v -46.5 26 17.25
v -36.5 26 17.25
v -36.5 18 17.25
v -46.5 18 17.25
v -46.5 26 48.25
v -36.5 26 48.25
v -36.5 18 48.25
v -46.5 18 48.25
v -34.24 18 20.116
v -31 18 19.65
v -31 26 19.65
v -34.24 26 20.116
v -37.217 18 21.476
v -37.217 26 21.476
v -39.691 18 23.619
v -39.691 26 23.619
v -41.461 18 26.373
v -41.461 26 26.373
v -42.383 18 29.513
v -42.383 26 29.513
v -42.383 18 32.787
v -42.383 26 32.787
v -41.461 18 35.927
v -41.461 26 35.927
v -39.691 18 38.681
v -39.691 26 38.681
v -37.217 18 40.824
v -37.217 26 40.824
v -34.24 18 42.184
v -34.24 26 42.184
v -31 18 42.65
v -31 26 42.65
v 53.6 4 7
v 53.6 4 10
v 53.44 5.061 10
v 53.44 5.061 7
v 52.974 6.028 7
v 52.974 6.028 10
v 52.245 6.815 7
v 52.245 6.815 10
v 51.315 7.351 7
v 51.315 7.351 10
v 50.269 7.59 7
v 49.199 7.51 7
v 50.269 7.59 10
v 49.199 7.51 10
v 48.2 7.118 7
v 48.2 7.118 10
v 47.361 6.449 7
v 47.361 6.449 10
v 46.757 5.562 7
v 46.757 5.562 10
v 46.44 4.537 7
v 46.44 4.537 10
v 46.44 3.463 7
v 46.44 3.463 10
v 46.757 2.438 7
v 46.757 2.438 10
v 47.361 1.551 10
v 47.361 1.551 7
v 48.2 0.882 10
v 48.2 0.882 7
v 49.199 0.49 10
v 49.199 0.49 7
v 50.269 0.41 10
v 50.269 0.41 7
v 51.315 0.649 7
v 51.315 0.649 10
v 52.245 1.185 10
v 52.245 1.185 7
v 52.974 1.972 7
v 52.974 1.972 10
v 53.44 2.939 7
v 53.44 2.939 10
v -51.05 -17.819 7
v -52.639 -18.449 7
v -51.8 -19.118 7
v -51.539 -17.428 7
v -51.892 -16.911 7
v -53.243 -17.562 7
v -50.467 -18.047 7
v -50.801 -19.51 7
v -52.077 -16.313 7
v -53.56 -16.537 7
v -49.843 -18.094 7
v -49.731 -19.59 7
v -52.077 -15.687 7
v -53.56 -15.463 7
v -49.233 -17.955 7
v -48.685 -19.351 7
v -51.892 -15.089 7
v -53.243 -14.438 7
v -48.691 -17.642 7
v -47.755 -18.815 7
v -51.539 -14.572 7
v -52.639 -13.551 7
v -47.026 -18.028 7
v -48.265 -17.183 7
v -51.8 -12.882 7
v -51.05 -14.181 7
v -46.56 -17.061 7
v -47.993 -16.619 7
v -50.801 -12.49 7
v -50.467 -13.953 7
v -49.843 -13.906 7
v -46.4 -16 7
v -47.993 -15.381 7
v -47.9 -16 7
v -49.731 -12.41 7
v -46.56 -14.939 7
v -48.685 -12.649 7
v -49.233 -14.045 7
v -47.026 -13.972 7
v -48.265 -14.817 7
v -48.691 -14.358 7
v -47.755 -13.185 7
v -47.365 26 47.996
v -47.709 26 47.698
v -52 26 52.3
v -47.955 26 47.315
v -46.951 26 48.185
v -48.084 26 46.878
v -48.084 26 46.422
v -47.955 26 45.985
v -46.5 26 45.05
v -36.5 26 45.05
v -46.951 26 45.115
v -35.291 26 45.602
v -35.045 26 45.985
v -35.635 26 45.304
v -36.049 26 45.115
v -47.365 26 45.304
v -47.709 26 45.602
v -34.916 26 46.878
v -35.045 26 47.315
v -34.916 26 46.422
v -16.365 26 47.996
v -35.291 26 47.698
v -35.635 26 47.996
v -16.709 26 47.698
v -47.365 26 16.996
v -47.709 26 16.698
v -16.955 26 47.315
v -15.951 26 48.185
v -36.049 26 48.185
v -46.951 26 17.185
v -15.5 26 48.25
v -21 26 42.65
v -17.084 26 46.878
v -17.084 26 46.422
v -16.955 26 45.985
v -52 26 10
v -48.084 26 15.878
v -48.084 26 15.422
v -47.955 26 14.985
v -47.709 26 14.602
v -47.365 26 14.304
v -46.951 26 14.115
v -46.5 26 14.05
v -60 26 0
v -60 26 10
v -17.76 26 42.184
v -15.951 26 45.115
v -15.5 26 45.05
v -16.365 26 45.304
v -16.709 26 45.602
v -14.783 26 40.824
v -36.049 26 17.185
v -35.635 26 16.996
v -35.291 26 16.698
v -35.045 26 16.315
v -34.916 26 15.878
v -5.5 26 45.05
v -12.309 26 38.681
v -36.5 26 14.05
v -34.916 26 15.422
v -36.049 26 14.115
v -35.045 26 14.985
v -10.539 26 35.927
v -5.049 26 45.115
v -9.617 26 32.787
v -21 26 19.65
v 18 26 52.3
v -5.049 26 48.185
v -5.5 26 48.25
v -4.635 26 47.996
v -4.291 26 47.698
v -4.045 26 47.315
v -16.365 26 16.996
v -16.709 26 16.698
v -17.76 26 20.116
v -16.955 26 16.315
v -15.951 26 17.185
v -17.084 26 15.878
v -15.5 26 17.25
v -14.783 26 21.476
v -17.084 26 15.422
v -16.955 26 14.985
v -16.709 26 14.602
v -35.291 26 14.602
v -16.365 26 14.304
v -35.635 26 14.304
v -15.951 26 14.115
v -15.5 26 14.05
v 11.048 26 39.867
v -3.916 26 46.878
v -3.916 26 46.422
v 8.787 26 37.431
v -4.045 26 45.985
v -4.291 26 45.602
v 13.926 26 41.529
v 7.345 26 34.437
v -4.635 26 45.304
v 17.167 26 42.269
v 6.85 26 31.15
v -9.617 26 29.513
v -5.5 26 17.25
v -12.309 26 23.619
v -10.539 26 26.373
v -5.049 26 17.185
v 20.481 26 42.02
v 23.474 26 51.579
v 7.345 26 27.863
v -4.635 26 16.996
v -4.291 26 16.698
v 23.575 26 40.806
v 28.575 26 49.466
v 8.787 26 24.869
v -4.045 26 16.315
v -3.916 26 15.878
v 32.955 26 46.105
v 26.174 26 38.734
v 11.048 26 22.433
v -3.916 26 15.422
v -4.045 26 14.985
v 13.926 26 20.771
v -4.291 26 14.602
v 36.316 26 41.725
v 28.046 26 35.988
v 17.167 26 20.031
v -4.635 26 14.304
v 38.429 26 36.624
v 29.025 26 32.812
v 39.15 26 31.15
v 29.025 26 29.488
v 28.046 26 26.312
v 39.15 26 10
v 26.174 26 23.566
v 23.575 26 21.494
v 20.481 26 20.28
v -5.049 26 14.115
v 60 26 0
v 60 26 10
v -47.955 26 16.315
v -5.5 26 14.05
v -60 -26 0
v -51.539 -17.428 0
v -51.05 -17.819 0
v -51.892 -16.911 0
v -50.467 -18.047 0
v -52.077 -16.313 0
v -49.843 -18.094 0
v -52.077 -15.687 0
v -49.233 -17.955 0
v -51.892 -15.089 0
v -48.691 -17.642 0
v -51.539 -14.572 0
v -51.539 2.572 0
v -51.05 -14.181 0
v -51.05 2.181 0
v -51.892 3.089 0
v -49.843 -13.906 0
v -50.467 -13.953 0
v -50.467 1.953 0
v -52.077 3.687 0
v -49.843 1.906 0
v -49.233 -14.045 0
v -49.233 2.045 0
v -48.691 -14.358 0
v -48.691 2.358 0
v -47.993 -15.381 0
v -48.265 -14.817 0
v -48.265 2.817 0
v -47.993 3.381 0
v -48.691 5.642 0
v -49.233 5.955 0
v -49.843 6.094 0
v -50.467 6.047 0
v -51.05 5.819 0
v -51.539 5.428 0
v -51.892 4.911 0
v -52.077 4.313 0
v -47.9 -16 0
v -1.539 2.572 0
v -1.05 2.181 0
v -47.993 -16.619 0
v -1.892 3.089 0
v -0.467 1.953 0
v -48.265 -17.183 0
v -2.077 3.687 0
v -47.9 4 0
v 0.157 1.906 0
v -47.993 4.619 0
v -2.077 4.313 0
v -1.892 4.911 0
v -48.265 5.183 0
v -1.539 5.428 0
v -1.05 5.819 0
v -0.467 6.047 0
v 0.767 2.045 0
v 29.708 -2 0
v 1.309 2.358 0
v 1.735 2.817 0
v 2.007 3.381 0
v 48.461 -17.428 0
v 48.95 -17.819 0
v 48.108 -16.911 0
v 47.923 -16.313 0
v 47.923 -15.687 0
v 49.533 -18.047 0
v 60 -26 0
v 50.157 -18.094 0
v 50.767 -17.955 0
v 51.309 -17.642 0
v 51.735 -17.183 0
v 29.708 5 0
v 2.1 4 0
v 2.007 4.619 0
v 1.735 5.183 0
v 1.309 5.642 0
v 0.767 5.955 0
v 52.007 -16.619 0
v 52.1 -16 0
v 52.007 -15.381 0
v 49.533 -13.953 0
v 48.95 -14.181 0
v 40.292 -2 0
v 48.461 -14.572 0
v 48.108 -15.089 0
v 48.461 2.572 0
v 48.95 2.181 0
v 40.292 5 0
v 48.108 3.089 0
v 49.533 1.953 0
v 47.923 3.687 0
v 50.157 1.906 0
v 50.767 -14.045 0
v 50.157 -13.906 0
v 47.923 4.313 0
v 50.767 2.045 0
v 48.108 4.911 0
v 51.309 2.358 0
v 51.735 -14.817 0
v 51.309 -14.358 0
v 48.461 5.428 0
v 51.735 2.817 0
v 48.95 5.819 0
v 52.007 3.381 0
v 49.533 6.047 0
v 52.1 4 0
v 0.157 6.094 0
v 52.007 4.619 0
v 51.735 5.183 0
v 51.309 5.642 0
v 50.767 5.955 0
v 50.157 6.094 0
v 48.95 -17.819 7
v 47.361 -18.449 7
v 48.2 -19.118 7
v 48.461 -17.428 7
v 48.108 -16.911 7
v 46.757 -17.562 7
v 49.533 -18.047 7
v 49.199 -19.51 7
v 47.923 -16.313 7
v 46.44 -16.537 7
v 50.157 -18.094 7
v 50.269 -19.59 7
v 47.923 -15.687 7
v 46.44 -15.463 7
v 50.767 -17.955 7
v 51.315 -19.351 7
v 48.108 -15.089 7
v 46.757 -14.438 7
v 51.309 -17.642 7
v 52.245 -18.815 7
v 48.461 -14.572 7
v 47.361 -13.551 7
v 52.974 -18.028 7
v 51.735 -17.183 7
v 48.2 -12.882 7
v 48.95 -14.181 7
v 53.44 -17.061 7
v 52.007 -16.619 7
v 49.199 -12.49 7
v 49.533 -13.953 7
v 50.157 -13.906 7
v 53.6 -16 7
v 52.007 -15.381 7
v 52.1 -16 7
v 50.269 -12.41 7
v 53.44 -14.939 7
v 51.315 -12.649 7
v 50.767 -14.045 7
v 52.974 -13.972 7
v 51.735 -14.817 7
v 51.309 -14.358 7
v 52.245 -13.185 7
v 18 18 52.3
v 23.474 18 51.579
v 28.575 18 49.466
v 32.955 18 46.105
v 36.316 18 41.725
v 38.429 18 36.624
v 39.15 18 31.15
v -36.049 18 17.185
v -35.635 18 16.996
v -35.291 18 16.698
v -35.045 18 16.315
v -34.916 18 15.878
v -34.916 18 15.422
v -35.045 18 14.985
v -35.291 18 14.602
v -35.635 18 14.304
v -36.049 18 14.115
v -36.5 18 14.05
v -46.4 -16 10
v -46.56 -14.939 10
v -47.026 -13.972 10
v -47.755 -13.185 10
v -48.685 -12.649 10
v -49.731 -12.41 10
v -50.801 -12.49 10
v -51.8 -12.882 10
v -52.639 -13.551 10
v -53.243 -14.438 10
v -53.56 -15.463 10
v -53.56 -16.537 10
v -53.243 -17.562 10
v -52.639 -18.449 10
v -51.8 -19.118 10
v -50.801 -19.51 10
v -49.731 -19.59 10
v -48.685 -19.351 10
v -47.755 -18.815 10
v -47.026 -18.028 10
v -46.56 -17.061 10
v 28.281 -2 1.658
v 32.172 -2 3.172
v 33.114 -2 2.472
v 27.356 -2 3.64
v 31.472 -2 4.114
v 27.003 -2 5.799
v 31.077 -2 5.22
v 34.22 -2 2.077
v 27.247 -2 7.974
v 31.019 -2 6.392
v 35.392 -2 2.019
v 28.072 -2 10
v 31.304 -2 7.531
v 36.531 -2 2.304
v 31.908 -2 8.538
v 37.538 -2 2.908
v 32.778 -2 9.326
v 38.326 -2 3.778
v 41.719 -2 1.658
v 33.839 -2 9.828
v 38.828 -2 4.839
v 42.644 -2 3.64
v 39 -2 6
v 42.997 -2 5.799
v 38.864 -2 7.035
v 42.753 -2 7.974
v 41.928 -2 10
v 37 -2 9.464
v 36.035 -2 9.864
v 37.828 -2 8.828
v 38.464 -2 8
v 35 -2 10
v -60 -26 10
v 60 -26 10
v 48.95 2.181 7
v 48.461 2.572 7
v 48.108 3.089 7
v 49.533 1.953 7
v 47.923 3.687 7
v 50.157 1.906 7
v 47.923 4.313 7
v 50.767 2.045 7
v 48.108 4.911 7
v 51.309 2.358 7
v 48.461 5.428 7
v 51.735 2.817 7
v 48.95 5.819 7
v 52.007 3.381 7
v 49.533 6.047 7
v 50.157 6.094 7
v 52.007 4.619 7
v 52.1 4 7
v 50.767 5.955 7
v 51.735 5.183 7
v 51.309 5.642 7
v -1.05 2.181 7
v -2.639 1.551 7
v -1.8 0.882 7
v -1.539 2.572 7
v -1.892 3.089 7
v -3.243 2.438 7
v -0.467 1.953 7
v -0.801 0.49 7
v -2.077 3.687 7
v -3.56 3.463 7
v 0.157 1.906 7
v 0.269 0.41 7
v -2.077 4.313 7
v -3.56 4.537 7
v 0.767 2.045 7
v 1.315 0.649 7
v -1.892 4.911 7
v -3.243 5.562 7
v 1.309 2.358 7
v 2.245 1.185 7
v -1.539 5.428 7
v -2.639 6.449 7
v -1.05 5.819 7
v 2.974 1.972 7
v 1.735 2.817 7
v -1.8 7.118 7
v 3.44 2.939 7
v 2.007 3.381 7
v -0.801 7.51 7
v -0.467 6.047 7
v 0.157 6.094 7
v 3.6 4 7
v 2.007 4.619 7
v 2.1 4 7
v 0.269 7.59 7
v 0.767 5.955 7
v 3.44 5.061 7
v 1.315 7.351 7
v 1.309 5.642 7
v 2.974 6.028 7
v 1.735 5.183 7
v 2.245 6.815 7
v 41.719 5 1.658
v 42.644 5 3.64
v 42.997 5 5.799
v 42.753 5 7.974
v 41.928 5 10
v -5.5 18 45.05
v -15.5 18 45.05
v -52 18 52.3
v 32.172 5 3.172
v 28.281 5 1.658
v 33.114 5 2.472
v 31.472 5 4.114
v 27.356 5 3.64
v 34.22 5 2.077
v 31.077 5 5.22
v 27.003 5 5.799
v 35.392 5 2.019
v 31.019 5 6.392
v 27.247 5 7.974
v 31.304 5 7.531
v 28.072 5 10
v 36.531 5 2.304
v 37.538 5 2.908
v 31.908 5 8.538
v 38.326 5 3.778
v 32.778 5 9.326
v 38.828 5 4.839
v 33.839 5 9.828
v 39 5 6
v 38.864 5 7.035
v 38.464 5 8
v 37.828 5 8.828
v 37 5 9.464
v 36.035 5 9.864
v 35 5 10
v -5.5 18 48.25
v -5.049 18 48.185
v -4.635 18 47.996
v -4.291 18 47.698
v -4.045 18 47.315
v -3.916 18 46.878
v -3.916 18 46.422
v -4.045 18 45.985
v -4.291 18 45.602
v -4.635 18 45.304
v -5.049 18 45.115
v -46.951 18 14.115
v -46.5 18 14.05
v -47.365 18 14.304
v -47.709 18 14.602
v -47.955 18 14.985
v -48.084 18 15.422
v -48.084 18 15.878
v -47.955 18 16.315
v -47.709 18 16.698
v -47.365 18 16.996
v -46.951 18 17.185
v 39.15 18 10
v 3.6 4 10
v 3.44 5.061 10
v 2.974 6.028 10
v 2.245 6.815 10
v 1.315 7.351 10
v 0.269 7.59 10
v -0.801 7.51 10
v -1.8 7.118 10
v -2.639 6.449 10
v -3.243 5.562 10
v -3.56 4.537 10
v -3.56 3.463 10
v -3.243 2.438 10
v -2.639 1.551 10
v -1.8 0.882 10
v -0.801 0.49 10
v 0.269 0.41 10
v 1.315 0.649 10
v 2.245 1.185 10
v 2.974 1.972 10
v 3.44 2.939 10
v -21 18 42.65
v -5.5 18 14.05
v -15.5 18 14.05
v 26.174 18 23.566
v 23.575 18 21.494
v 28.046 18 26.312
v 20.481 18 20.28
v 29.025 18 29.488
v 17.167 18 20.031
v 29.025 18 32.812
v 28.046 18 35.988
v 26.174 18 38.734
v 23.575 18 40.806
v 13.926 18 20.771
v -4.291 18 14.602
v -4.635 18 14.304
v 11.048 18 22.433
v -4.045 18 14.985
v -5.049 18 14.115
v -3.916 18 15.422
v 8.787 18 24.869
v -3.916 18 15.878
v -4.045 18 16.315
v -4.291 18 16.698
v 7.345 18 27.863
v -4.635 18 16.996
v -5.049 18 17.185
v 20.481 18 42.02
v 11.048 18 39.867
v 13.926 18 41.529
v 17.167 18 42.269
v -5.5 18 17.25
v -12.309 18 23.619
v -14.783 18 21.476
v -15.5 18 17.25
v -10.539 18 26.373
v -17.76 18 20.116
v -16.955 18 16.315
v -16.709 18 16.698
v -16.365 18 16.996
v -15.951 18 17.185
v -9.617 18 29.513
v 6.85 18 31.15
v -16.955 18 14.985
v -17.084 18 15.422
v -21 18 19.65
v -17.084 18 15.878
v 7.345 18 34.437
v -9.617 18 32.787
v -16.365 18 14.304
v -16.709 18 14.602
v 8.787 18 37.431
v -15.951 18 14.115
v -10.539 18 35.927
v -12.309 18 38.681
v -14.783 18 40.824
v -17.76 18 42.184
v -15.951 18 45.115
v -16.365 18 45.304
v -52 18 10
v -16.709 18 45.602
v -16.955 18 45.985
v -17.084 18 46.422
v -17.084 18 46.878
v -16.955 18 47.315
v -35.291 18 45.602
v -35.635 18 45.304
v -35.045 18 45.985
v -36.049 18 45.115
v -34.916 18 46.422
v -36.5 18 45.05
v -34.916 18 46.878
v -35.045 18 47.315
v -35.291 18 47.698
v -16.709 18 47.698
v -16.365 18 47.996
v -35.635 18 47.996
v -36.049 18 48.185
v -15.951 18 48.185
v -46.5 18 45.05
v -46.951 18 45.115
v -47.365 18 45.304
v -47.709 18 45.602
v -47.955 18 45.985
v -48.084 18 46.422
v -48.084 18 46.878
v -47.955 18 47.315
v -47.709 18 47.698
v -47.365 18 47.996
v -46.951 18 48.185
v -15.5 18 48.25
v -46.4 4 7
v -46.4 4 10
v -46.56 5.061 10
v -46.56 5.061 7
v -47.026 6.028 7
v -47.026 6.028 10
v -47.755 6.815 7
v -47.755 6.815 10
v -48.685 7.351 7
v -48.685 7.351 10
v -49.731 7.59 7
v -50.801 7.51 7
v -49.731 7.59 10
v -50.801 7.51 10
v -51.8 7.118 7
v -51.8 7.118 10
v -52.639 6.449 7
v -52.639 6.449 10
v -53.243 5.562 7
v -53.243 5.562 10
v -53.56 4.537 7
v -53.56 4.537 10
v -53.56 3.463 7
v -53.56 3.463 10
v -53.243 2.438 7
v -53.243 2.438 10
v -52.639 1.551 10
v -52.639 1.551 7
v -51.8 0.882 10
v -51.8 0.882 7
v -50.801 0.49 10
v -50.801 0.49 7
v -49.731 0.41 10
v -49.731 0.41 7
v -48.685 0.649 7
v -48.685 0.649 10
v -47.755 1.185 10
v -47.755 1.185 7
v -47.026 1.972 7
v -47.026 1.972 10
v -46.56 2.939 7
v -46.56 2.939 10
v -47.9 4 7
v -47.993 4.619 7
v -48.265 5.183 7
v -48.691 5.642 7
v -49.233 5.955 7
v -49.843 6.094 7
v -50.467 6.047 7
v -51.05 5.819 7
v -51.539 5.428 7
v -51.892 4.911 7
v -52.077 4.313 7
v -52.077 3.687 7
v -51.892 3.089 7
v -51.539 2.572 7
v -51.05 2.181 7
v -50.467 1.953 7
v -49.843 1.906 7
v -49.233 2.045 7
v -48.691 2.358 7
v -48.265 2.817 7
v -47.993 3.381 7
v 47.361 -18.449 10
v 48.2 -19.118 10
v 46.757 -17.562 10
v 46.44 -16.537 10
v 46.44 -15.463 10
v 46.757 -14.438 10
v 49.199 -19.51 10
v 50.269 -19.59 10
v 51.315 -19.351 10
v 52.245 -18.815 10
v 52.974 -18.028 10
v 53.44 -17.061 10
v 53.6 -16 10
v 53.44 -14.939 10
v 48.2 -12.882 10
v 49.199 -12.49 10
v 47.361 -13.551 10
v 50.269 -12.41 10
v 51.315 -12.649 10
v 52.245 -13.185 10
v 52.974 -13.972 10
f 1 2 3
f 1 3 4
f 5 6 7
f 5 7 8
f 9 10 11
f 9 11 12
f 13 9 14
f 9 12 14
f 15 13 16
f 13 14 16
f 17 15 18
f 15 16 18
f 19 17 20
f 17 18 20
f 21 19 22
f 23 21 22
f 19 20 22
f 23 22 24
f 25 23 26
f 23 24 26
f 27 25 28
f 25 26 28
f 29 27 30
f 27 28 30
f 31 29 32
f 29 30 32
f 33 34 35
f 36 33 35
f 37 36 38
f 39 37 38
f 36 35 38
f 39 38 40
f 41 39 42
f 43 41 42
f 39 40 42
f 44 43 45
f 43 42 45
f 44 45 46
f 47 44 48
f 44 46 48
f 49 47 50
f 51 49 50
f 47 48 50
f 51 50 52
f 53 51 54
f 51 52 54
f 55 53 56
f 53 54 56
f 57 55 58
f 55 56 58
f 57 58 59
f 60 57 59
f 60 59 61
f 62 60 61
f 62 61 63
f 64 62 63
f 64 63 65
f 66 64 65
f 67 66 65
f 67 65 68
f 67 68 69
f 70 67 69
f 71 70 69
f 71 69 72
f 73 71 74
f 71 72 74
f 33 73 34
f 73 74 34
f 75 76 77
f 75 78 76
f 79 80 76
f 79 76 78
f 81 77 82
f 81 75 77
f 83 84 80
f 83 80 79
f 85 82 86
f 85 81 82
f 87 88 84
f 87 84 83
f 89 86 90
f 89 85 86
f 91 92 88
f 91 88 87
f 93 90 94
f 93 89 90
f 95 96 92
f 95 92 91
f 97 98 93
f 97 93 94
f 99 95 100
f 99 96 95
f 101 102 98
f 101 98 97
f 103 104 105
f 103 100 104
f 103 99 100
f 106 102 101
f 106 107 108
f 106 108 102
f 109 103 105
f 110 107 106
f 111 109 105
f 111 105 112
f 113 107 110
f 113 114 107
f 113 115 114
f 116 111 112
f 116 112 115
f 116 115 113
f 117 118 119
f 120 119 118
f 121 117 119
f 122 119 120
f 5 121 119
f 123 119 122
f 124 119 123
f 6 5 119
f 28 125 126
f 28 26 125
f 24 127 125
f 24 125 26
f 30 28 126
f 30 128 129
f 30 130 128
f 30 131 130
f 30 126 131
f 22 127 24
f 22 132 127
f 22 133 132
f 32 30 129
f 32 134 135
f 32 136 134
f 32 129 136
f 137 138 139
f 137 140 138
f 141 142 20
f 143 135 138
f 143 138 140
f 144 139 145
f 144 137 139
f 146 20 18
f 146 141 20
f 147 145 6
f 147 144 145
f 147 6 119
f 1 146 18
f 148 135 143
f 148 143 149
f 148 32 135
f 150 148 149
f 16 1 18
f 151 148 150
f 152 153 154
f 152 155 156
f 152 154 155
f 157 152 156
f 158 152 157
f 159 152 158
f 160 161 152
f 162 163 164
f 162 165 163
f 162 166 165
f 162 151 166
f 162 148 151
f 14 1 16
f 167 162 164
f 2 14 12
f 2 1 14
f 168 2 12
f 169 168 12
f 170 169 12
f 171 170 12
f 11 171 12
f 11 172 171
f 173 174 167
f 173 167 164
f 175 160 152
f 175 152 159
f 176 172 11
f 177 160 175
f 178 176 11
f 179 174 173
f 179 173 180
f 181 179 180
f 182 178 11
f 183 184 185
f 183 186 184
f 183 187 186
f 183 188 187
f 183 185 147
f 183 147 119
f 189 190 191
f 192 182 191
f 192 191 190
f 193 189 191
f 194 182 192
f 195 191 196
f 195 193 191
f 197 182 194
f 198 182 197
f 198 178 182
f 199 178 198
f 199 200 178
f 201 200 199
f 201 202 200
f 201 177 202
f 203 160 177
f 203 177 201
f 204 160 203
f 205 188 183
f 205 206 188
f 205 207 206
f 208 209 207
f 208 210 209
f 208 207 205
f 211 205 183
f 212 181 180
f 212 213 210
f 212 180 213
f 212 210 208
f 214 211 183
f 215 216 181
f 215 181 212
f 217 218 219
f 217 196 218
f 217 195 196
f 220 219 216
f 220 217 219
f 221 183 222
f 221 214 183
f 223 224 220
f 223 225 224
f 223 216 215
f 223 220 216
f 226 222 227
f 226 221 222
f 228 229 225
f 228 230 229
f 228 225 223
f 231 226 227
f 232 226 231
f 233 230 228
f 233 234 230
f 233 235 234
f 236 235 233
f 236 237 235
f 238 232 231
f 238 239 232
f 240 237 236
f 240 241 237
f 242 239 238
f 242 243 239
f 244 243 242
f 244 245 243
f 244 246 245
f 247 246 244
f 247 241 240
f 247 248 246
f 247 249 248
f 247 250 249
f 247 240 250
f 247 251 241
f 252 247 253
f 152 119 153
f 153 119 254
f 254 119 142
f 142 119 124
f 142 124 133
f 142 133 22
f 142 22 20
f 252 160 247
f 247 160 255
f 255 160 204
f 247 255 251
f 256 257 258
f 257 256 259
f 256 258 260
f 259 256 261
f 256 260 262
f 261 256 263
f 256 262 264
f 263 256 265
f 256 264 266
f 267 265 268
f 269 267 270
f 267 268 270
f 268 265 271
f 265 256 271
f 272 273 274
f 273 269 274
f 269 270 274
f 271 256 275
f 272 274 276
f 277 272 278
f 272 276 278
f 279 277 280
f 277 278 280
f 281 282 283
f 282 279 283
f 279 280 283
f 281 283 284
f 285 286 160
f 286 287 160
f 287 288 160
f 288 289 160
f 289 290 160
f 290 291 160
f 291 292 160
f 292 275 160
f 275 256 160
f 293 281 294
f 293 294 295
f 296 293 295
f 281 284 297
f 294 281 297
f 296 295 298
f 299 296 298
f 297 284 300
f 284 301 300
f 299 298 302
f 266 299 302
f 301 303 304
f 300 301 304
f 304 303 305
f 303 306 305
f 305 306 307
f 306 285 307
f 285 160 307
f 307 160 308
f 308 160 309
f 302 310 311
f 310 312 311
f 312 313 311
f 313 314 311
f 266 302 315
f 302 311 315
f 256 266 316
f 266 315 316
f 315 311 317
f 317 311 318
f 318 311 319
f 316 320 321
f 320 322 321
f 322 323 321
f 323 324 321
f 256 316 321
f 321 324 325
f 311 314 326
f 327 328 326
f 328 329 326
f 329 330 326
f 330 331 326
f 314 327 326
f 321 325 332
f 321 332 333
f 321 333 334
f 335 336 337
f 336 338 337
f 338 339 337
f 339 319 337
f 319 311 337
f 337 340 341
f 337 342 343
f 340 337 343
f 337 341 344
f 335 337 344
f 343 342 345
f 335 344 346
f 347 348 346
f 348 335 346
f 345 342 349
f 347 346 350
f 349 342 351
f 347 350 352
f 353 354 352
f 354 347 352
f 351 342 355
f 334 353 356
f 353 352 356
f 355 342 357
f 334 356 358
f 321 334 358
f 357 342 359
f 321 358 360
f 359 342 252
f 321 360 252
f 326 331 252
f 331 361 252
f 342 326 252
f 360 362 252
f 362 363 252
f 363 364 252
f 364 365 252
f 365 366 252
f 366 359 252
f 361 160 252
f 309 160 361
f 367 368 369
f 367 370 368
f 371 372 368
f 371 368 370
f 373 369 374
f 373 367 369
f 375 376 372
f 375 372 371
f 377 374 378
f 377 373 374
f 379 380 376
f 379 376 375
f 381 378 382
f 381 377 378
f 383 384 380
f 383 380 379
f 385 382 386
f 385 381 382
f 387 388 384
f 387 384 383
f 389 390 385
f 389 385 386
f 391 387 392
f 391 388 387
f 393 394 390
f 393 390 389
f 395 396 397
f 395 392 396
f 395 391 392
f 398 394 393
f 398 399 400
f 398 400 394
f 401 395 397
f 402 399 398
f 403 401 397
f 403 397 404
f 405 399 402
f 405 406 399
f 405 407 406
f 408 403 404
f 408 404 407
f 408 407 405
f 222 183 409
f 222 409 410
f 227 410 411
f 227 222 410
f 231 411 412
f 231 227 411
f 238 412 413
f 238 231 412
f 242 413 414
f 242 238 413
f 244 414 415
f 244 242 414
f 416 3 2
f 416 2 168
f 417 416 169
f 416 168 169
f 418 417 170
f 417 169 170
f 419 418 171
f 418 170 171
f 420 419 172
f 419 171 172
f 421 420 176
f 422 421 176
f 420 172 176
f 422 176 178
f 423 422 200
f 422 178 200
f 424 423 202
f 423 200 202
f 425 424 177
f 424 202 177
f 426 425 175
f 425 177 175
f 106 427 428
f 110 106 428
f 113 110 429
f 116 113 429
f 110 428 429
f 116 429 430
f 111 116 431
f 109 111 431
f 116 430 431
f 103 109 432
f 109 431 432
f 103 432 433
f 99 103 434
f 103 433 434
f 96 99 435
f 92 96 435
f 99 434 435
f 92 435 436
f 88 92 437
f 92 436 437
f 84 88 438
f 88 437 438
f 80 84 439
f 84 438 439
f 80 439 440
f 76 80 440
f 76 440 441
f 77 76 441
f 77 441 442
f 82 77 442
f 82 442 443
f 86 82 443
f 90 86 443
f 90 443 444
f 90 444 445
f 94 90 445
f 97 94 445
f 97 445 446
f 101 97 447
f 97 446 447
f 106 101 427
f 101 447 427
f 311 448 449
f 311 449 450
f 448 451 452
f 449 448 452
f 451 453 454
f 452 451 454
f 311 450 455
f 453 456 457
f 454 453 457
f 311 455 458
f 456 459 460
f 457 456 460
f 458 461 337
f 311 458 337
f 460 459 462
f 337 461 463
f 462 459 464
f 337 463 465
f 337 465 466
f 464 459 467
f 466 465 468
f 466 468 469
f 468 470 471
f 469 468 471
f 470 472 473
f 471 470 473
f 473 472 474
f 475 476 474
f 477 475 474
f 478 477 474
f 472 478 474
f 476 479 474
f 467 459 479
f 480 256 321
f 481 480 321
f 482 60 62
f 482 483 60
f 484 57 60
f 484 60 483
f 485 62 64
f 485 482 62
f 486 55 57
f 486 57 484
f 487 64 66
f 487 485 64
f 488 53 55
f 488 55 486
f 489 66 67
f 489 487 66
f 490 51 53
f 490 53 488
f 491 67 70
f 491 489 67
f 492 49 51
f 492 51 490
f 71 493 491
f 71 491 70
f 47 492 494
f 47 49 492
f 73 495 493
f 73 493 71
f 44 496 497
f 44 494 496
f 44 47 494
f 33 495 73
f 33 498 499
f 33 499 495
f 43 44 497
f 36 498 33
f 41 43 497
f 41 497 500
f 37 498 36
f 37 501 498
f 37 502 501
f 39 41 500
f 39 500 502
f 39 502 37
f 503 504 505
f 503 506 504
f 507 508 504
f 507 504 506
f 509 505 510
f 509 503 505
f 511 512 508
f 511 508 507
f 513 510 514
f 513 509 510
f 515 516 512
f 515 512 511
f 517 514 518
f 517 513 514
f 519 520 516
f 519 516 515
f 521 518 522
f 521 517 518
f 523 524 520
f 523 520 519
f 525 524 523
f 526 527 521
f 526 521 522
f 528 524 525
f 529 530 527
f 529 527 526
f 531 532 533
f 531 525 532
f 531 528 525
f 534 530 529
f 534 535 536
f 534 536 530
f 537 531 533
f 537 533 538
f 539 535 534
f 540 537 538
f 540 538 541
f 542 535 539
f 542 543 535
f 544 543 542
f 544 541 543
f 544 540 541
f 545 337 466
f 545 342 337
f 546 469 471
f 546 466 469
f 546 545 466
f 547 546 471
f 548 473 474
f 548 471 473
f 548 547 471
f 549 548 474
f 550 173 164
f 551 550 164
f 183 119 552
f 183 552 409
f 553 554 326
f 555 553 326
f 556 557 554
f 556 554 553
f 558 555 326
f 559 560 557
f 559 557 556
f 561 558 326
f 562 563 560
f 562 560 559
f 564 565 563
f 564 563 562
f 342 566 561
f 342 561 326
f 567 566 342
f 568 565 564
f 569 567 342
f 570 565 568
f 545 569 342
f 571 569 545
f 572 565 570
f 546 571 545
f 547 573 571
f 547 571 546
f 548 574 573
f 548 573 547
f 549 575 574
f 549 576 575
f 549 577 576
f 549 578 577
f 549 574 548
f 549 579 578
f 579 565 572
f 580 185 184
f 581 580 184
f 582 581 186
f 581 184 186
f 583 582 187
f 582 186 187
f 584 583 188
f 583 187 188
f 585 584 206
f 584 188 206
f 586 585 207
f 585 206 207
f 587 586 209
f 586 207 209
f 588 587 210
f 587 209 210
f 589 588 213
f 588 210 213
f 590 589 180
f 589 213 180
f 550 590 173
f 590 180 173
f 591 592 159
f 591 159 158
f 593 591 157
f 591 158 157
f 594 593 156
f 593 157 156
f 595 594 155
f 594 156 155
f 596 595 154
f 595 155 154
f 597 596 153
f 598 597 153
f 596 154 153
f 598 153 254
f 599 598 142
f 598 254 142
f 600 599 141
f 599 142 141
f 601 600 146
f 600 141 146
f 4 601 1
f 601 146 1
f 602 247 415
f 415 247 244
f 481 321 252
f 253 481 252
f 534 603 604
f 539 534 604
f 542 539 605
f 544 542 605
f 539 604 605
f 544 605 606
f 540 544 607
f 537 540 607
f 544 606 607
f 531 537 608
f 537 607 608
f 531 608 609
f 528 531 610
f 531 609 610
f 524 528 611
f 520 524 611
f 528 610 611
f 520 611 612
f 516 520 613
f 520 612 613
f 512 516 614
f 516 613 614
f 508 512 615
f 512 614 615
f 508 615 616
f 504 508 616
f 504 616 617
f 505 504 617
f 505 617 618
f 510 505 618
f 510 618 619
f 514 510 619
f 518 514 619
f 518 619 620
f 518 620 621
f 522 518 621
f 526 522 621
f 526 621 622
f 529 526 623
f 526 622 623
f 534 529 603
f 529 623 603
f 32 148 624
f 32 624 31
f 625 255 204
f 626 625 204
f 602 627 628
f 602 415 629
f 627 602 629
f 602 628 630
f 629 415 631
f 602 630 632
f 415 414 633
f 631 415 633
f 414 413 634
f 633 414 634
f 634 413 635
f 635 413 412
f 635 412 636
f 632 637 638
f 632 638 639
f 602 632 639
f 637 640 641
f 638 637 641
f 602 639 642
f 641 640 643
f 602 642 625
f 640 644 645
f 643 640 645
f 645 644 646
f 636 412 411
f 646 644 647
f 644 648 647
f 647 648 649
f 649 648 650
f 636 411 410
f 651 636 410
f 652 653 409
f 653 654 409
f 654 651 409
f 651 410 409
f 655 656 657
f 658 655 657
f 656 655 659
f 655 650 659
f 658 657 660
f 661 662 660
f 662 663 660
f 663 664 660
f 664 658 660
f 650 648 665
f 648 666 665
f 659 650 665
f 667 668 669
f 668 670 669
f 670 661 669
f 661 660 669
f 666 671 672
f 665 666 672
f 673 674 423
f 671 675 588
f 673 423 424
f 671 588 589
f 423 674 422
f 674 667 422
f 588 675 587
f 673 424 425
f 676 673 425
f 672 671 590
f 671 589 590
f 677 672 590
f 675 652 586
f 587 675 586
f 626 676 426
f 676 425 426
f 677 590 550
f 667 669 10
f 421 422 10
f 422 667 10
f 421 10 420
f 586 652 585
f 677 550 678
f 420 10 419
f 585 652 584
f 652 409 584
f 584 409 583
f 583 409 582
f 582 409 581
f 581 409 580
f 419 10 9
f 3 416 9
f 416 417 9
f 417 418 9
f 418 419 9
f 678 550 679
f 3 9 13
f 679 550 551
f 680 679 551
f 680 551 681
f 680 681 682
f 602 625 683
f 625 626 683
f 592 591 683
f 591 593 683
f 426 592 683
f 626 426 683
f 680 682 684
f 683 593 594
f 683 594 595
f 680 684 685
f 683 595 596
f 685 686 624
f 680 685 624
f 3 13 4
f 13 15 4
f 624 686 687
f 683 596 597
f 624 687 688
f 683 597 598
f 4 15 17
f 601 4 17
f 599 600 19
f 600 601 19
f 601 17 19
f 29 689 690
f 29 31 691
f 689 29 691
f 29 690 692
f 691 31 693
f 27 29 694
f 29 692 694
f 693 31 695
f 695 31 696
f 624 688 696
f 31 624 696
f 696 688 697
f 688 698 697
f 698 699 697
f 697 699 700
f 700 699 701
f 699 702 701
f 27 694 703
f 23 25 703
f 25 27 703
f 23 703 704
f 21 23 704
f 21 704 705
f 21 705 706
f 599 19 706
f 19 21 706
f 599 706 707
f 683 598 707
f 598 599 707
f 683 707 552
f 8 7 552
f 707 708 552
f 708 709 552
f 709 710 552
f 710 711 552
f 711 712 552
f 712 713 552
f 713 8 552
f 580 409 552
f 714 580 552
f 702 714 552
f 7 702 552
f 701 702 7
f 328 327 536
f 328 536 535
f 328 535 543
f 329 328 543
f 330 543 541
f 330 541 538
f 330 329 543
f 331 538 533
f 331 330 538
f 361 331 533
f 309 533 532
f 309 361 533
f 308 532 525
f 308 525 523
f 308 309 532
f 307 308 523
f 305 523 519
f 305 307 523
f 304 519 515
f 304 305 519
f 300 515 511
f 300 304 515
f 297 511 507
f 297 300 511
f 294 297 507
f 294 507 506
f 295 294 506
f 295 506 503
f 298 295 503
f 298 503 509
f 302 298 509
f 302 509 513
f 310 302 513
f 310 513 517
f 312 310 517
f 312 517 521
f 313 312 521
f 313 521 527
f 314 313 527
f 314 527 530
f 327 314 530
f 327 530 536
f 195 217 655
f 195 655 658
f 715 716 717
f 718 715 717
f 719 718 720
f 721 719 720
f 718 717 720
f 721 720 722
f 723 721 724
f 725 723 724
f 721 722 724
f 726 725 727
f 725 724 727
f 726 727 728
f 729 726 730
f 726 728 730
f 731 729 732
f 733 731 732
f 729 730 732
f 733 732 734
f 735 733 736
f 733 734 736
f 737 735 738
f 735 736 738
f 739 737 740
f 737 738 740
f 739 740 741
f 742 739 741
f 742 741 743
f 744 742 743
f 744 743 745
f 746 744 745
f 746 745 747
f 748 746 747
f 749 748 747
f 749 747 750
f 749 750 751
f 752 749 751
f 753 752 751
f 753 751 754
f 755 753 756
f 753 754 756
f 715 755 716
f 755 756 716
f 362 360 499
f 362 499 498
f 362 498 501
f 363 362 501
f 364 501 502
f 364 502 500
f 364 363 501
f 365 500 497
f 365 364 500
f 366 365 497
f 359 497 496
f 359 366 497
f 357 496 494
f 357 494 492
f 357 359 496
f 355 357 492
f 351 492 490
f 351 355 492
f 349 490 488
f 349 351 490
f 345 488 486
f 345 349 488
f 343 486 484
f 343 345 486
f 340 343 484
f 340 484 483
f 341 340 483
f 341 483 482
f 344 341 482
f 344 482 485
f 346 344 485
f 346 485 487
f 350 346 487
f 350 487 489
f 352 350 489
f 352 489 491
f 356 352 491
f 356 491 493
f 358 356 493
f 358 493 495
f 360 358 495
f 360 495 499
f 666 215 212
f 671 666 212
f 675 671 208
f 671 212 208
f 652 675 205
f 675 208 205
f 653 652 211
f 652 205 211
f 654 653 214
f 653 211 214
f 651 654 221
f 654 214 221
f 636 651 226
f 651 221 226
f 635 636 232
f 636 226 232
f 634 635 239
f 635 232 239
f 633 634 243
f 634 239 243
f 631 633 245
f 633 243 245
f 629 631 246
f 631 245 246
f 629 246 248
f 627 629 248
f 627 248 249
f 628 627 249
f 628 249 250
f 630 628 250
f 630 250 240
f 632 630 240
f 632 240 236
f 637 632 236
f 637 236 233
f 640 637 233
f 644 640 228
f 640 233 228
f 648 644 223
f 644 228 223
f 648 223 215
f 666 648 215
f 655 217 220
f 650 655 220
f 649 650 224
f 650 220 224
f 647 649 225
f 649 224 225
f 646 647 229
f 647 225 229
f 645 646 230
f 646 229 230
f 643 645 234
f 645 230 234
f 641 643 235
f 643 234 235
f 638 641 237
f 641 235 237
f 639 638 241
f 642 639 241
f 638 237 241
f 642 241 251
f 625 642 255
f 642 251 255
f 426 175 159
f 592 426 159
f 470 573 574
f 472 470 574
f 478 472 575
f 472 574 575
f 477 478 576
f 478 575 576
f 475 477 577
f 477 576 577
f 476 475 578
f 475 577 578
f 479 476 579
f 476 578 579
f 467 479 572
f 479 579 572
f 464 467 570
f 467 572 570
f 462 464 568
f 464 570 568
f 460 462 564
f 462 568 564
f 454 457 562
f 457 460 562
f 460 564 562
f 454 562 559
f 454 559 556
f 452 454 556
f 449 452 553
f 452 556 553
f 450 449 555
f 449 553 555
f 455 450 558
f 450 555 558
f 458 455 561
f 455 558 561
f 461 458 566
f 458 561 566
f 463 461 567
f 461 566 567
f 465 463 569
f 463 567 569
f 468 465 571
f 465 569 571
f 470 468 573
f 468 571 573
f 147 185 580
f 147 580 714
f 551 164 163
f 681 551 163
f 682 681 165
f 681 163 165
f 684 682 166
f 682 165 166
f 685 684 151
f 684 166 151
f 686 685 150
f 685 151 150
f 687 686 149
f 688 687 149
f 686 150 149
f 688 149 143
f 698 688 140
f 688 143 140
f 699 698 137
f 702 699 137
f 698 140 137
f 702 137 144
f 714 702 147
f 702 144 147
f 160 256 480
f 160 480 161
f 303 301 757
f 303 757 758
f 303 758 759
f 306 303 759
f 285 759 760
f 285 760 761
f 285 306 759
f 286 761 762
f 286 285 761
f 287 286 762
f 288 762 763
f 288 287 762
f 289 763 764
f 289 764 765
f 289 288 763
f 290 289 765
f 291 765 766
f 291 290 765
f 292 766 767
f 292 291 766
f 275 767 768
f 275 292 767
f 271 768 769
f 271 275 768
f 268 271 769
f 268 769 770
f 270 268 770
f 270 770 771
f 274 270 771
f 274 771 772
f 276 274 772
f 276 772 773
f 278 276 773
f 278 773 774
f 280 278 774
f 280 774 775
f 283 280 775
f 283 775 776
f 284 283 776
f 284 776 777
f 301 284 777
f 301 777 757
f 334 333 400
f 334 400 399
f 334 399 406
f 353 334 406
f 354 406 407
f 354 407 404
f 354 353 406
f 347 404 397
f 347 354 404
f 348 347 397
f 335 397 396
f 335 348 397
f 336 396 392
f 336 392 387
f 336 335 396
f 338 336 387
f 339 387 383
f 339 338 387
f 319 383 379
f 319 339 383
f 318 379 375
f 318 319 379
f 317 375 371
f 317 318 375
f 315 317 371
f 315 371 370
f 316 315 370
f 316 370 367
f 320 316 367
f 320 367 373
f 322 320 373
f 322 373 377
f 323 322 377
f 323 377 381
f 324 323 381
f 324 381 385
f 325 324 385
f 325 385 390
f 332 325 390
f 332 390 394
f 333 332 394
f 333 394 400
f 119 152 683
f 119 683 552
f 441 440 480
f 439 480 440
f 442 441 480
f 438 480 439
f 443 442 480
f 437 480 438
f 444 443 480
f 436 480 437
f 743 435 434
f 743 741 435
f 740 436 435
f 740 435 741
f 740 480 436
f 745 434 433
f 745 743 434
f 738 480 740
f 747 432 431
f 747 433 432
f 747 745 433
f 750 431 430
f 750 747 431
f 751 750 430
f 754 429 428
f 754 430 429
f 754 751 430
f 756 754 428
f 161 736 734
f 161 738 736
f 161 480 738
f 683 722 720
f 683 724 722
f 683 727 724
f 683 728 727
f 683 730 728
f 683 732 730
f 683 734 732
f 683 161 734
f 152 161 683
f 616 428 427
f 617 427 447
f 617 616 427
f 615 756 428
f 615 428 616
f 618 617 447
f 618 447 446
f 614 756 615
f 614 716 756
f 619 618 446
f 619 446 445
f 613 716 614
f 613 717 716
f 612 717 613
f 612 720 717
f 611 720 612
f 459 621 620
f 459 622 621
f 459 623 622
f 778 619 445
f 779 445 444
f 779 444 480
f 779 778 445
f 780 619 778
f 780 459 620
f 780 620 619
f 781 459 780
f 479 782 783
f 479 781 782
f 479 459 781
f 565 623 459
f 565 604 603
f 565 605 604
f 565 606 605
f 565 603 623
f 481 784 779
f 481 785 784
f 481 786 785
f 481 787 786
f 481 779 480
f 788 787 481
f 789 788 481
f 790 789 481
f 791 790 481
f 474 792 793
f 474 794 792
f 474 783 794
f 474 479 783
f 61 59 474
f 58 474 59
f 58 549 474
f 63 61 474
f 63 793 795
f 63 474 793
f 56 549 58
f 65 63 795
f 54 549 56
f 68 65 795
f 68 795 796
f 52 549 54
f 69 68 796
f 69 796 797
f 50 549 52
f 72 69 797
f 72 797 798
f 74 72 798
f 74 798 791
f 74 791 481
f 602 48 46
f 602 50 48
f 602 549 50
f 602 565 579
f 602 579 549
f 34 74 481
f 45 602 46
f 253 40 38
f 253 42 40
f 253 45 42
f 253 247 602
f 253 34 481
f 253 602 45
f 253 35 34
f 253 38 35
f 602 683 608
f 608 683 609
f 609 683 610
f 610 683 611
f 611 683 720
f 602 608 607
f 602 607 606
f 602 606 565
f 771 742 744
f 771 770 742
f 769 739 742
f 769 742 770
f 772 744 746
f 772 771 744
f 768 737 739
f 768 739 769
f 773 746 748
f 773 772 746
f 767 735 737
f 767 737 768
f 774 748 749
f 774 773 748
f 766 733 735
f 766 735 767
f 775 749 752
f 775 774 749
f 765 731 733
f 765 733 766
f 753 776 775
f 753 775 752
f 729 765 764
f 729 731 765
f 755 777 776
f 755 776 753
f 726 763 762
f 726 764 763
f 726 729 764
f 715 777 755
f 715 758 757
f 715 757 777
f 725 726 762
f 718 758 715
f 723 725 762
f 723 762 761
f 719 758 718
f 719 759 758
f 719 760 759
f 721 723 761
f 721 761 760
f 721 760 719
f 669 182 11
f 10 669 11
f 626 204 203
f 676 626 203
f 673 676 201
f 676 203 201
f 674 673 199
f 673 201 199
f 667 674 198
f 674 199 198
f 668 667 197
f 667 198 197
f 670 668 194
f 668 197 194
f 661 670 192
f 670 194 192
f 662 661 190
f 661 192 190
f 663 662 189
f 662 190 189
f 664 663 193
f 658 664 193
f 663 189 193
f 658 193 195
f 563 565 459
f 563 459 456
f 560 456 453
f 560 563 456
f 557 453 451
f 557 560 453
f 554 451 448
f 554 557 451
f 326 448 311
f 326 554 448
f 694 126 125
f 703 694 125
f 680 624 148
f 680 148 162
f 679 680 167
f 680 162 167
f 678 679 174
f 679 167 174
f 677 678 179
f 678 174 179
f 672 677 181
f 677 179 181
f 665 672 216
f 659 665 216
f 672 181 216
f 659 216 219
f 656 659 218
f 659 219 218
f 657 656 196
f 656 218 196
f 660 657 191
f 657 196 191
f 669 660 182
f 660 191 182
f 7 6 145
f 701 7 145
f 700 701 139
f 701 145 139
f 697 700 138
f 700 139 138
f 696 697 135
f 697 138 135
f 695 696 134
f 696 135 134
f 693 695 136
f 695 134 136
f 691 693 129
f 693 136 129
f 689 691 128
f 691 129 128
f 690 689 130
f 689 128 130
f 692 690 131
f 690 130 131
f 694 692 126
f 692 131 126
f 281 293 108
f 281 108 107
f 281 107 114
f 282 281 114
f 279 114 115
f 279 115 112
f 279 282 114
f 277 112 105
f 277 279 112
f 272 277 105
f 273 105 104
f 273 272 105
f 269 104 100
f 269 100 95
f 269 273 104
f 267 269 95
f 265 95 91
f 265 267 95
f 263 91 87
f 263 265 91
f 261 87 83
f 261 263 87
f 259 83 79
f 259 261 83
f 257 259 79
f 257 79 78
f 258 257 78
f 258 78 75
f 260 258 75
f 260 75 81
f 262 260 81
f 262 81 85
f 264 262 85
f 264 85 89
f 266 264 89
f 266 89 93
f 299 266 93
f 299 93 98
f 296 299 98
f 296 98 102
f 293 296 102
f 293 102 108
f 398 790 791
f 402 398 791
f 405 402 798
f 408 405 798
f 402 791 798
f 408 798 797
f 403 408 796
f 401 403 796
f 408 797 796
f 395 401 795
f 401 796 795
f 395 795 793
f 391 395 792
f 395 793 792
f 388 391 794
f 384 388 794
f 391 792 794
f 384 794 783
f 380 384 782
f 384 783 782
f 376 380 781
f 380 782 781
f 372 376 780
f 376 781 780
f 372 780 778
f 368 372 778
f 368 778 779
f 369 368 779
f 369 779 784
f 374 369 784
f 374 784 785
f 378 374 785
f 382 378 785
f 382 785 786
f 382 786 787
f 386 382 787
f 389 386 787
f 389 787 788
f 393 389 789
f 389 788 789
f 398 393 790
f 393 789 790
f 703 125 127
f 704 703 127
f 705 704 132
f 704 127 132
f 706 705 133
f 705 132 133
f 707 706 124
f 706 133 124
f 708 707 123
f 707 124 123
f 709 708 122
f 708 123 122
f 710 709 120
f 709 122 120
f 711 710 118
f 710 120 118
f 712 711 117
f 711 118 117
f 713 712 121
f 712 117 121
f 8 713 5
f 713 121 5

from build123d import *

# Parameters (mm, degrees)
CYLINDER001_R     = 4
CYLINDER001_DEPTH = 10
CYLINDER_R        = 8
CYLINDER_DEPTH    = 7
CUT_ROLL_ANGLE    = 90
SKETCH_W          = 120
SKETCH_H          = 52
SKETCH_R          = 2.1
PAD_DEPTH         = 10
SKETCH007_R       = 11.15
PAD001_DEPTH      = 8
SKETCH008_R       = 3.6
SKETCH008_R_2     = 2.1
POCKET_DEPTH      = 3


with BuildPart() as zylinder001:
    # Cylinder001 → Cylinder001 (new body)
    with BuildSketch(Plane.XY):
        Circle(CYLINDER001_R)
    extrude(amount=CYLINDER001_DEPTH)


with BuildPart() as cut:
    # Cylinder → Cylinder (new body)
    with BuildSketch(Plane.XY):
        Circle(CYLINDER_R)
    extrude(amount=CYLINDER_DEPTH)

    # Cut: cut Zylinder001
    add(zylinder001.part, mode=Mode.SUBTRACT)


with BuildPart() as cut_1:
    # Cut roll: moved
    add(cut.part.rotate(Axis((0, 0, 0), (1, 0, 0)), CUT_ROLL_ANGLE))


with BuildPart() as cut_2:
    # Cut placement: moved
    add(cut_1.part.moved(Location((35, 5, 6))))


with BuildPart() as cut001:
    # Sketch → Pad (new body)
    with BuildSketch(Plane.XY):
        Rectangle(SKETCH_W, SKETCH_H)
        with Locations((-50, -16)):
            Circle(SKETCH_R, mode=Mode.SUBTRACT)
        with Locations((-50, 4)):
            Circle(SKETCH_R, mode=Mode.SUBTRACT)
        with Locations((0, 4)):
            Circle(SKETCH_R, mode=Mode.SUBTRACT)
        with Locations((50, 4)):
            Circle(SKETCH_R, mode=Mode.SUBTRACT)
        with Locations((50, -16)):
            Circle(SKETCH_R, mode=Mode.SUBTRACT)
    extrude(amount=PAD_DEPTH)

    # Sketch007 → Pad001 (new body)
    with BuildSketch(Plane(origin=(0, 26, 0), x_dir=(-1, 0, 0), z_dir=(0, 1, 0))):
        with BuildLine():
            Line((0, 10), (52, 10))
            Line((52, 10), (52, 52.3))
            Line((52, 52.3), (0, 52.3))
            Line((0, 52.3), (-18.00006, 52.3))
            ThreePointArc((-18.00006, 52.3), (-32.95533, 46.105287), (-39.15, 31.15))
            Line((-39.15, 10), (-39.15, 31.15))
            Line((0, 10), (-39.15, 10))
        make_face()
        with Locations((-18, 31.15)):
            Circle(SKETCH007_R, mode=Mode.SUBTRACT)
        with BuildLine():
            ThreePointArc((21, 42.65), (9.5, 31.15), (21, 19.65))
            Line((21, 19.65), (31, 19.65))
            ThreePointArc((31, 19.65), (42.5, 31.15), (31, 42.65))
            Line((21, 42.65), (31, 42.65))
        make_face(mode=Mode.SUBTRACT)
        with BuildLine():
            ThreePointArc((36.5, 48.25), (34.9, 46.65), (36.5, 45.05))
            Line((36.5, 45.05), (46.5, 45.05))
            ThreePointArc((46.5, 45.05), (48.1, 46.65), (46.5, 48.25))
            Line((36.5, 48.25), (46.5, 48.25))
        make_face(mode=Mode.SUBTRACT)
        with BuildLine():
            ThreePointArc((5.5, 48.25), (3.9, 46.65), (5.5, 45.05))
            Line((5.5, 45.05), (15.5, 45.05))
            ThreePointArc((15.5, 45.05), (17.1, 46.65), (15.5, 48.25))
            Line((5.5, 48.25), (15.5, 48.25))
        make_face(mode=Mode.SUBTRACT)
        with BuildLine():
            ThreePointArc((5.5, 17.25), (3.9, 15.65), (5.5, 14.05))
            Line((5.5, 14.05), (15.5, 14.05))
            ThreePointArc((15.5, 14.05), (17.1, 15.65), (15.5, 17.25))
            Line((5.5, 17.25), (15.5, 17.25))
        make_face(mode=Mode.SUBTRACT)
        with BuildLine():
            ThreePointArc((36.5, 17.25), (34.9, 15.65), (36.5, 14.05))
            Line((36.5, 14.05), (46.5, 14.05))
            ThreePointArc((46.5, 14.05), (48.1, 15.65), (46.5, 17.25))
            Line((36.5, 17.25), (46.5, 17.25))
        make_face(mode=Mode.SUBTRACT)
    extrude(amount=-PAD001_DEPTH)

    # Sketch008 → Pocket (cut)
    with BuildSketch(Plane.XY.offset(10)):
        with Locations((-50, 4)):
            Circle(SKETCH008_R)
        with Locations((-50, 4)):
            Circle(SKETCH008_R_2, mode=Mode.SUBTRACT)
        with Locations((-50, -16)):
            Circle(SKETCH008_R)
        with Locations((-50, -16)):
            Circle(SKETCH008_R_2, mode=Mode.SUBTRACT)
        with Locations((0, 4)):
            Circle(SKETCH008_R)
        with Locations((0, 4)):
            Circle(SKETCH008_R_2, mode=Mode.SUBTRACT)
        with Locations((50, 4)):
            Circle(SKETCH008_R)
        with Locations((50, 4)):
            Circle(SKETCH008_R_2, mode=Mode.SUBTRACT)
        with Locations((50, -16)):
            Circle(SKETCH008_R)
        with Locations((50, -16)):
            Circle(SKETCH008_R_2, mode=Mode.SUBTRACT)
    extrude(amount=-POCKET_DEPTH, mode=Mode.SUBTRACT)

    # Cut001: cut Cut
    add(cut_2.part, mode=Mode.SUBTRACT)


solid = cut001.part
